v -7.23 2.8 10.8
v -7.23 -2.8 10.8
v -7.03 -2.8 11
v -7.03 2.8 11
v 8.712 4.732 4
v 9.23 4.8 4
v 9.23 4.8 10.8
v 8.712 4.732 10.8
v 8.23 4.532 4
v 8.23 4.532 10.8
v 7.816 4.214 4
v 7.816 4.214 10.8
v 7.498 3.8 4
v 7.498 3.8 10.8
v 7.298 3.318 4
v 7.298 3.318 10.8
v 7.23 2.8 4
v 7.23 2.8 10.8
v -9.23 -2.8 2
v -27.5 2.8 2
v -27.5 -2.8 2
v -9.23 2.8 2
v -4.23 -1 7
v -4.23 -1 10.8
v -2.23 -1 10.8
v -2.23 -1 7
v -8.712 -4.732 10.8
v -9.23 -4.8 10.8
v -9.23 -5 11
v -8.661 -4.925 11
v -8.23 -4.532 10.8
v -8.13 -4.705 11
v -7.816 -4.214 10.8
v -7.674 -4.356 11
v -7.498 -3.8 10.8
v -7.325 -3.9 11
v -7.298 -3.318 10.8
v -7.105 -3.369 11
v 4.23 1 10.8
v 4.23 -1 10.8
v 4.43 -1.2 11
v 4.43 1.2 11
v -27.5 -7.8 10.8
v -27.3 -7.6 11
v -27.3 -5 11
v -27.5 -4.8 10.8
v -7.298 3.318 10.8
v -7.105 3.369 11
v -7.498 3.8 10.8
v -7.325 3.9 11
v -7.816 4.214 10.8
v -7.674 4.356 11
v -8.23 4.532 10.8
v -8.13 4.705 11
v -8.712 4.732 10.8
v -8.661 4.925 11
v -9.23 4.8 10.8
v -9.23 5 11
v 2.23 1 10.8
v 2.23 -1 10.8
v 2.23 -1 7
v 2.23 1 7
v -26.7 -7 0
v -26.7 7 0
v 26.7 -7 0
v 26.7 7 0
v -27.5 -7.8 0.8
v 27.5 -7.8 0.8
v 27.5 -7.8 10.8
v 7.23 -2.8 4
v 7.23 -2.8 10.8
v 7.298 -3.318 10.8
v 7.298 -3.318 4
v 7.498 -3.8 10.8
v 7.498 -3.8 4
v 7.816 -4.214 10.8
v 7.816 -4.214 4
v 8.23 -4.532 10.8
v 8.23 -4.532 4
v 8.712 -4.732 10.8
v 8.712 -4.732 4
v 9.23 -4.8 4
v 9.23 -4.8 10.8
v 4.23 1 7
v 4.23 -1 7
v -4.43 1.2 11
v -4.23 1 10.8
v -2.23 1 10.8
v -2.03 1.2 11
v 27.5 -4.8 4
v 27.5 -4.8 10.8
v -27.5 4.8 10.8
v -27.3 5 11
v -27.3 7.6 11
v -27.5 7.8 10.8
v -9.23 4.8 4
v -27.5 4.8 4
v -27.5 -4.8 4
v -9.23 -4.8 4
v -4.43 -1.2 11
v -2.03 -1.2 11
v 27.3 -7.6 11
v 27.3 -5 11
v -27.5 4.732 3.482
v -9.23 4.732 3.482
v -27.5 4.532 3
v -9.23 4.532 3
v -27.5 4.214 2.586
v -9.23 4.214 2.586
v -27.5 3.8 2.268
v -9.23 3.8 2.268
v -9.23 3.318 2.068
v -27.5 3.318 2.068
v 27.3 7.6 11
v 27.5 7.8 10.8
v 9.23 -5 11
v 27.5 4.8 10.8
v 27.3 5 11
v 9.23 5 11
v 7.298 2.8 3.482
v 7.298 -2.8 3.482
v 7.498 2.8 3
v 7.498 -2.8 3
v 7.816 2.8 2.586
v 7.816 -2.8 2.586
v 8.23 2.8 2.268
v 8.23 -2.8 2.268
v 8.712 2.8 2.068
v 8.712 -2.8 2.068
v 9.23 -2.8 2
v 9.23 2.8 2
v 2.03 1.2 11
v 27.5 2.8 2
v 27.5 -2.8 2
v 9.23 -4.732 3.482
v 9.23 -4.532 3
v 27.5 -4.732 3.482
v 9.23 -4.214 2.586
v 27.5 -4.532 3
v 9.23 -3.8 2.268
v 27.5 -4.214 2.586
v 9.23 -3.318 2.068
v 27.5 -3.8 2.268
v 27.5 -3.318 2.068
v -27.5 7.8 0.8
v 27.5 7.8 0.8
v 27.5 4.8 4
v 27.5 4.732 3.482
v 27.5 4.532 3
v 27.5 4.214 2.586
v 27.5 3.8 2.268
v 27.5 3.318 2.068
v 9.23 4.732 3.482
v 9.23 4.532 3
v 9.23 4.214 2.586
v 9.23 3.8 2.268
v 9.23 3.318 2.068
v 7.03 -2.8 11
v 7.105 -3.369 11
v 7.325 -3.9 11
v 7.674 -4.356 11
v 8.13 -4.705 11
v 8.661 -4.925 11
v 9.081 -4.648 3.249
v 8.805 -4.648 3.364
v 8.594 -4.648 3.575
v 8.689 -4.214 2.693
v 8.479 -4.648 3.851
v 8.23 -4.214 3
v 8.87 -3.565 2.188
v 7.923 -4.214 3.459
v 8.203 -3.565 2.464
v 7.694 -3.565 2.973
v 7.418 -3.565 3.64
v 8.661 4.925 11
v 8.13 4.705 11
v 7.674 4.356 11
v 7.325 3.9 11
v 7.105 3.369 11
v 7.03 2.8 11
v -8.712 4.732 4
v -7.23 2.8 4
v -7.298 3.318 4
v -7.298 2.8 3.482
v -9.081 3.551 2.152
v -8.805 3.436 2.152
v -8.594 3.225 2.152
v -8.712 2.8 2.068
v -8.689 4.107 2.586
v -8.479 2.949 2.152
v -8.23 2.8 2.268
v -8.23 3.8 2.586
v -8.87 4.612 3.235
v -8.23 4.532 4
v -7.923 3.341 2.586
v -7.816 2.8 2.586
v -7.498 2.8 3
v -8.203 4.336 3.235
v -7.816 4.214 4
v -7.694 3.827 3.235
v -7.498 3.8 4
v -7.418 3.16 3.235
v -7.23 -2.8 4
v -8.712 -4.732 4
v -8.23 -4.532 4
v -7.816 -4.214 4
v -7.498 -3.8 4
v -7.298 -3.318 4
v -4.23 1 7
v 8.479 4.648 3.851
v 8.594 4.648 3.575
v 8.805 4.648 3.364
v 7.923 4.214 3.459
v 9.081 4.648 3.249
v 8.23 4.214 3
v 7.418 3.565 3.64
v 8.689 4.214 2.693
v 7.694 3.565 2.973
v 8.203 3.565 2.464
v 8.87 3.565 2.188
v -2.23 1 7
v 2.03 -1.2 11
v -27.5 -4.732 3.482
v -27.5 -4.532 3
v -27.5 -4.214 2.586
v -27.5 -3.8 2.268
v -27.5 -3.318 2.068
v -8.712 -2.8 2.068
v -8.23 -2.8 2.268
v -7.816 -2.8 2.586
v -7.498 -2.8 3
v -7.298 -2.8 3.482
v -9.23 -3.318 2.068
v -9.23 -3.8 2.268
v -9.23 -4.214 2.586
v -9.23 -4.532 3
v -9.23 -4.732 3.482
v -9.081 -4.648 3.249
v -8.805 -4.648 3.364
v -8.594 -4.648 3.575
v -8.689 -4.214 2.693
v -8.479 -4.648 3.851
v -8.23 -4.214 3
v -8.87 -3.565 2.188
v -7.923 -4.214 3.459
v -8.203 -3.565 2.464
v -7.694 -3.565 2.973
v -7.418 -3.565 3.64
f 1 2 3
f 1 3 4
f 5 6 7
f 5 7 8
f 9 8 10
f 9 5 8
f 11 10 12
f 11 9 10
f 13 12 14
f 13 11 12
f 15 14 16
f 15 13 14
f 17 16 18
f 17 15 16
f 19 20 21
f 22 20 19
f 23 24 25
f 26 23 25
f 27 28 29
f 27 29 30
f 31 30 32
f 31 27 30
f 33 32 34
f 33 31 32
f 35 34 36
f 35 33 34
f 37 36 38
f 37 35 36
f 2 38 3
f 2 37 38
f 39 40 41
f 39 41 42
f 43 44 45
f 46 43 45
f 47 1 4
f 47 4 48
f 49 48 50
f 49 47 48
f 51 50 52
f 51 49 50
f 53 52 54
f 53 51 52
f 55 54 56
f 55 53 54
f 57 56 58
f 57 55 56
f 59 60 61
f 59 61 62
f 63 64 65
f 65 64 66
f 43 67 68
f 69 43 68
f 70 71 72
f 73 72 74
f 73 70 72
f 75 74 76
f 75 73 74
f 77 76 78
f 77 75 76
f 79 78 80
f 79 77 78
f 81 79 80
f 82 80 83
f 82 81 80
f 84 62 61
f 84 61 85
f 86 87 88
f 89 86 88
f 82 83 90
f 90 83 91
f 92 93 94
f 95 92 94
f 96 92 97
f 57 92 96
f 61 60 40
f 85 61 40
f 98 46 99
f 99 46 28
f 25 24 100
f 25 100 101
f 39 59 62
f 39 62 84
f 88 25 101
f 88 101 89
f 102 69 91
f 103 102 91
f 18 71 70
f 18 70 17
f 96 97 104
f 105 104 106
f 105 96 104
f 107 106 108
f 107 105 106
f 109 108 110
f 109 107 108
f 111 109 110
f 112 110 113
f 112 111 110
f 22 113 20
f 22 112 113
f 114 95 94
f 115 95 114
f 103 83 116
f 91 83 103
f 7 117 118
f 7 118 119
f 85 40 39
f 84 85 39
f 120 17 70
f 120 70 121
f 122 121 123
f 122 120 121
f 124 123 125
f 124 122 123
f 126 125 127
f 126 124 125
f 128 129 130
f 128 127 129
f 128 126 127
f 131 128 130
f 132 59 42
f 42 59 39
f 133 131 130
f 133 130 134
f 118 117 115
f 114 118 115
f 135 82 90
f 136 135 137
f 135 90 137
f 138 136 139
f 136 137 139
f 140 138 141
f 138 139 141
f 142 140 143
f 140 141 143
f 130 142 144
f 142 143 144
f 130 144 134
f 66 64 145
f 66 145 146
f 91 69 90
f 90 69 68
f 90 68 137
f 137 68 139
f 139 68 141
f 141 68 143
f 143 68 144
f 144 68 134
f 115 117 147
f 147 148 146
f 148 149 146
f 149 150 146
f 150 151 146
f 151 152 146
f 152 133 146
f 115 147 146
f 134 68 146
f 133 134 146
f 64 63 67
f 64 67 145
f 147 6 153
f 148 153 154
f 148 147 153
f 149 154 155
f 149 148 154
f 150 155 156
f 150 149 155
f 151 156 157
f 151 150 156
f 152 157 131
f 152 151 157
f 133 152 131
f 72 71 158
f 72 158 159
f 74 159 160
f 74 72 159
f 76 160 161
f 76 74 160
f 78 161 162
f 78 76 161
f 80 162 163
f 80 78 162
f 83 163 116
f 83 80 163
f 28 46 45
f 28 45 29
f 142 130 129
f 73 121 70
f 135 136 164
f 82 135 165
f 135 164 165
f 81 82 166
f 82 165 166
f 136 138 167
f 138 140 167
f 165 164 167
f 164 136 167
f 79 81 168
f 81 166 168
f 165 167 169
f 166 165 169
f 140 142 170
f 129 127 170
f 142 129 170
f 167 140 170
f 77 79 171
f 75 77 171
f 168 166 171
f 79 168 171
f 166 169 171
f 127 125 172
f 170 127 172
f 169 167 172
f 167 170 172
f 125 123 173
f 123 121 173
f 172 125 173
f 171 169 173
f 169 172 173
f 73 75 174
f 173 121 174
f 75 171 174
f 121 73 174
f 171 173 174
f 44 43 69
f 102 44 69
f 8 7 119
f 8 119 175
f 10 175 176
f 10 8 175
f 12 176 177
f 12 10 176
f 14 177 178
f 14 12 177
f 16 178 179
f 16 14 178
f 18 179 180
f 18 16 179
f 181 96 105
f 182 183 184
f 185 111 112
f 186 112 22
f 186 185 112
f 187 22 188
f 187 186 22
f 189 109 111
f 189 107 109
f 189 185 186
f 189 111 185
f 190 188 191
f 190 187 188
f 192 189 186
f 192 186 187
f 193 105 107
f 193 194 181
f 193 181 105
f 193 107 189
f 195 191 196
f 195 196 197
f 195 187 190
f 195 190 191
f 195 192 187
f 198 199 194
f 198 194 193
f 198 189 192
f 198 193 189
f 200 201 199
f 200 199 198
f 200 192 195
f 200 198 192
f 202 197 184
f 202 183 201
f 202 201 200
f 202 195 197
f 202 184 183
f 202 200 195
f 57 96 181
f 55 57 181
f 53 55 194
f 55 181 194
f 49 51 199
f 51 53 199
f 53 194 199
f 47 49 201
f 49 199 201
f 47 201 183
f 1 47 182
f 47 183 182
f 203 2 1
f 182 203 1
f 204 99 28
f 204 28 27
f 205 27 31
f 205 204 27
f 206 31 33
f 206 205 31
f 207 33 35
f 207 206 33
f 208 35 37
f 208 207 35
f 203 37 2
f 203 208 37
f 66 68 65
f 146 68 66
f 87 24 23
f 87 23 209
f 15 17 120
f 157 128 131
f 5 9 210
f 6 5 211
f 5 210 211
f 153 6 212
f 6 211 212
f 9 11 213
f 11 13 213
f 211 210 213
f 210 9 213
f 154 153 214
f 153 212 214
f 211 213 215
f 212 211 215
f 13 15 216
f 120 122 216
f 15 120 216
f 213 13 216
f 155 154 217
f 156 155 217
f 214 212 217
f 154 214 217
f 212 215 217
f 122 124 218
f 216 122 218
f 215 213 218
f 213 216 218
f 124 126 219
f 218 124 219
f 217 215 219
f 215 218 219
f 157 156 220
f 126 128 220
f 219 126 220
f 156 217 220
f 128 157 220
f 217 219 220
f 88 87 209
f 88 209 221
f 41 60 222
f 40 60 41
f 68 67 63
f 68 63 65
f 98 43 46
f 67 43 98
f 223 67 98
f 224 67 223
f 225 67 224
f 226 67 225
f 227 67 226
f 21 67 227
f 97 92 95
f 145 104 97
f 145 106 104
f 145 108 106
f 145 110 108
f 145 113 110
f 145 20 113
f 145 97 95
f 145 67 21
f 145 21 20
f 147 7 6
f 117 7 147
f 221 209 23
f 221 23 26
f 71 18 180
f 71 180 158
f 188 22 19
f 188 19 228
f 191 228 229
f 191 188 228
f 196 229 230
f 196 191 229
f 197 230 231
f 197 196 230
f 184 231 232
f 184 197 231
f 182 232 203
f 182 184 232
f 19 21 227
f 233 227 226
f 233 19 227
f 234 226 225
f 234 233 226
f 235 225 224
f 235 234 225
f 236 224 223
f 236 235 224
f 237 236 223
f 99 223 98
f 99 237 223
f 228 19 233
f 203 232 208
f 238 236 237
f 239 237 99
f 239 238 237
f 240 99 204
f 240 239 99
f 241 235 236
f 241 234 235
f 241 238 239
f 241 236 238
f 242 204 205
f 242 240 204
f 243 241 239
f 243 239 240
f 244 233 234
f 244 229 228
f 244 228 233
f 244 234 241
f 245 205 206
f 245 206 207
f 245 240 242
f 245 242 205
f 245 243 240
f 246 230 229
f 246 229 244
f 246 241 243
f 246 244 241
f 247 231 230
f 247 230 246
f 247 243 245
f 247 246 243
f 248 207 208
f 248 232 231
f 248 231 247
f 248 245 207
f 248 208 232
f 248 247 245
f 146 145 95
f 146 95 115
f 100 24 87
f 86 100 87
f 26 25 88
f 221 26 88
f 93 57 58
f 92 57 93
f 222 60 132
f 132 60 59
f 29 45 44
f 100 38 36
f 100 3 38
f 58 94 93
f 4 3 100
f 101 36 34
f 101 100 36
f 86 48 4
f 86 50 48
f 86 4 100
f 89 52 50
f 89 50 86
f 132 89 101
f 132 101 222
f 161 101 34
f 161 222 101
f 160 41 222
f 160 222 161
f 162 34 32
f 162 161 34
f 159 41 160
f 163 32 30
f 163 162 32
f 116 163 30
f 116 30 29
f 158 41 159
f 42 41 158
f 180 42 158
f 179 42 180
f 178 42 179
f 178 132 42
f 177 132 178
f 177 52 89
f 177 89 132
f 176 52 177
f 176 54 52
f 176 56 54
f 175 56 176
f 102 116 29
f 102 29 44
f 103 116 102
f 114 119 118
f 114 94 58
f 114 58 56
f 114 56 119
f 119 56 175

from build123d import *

# Parameters (mm, degrees)
F0_W     = 55
F0_H     = 15.6
F1_DEPTH = 11
F2_W     = 2
F2_H     = 2
F3_DEPTH = 4
F4_W     = 20.27
F4_H     = 9.6
F5_DEPTH = 9
F6_R     = 2
F7_SIZE  = 0.2
F8_SIZE  = 0.8


with BuildPart() as f1:
    # F0 (on Top) → F1 (new body)
    with BuildSketch(Plane.XY):
        Rectangle(F0_W, F0_H)
    extrude(amount=F1_DEPTH)

    # F2 (on face) → F3 (cut)
    with BuildSketch(Plane.XY.offset(11)):
        with Locations((-3.23, 0)):
            Rectangle(F2_W, F2_H)
        with Locations((3.23, 0)):
            Rectangle(F2_W, F2_H)
    extrude(amount=-F3_DEPTH, mode=Mode.SUBTRACT)

    # F4 (on face) → F5 (cut)
    with BuildSketch(Plane.XY.offset(11)):
        with Locations((-17.365, 0)):
            Rectangle(F4_W, F4_H)
        with Locations((17.365, 0)):
            Rectangle(F4_W, F4_H)
    extrude(amount=-F5_DEPTH, mode=Mode.SUBTRACT)

    # F6
    f6_edges = [f1.edges().sort_by_distance(p)[0] for p in [
        (-7.23, 4.8, 6.5),
        (-17.365, 4.8, 2),
        (-7.23, 0, 2),
        (-17.365, -4.8, 2),
        (-7.23, -4.8, 6.5),
        (7.23, 0, 2),
        (7.23, 4.8, 6.5),
        (17.365, 4.8, 2),
        (17.365, -4.8, 2),
        (7.23, -4.8, 6.5),
    ]]
    fillet(f6_edges, radius=F6_R)

    # F7
    f7_edges = [f1.edges().sort_by_distance(p)[0] for p in [
        (-18.365, -4.8, 11),
        (-7.815786, -4.214214, 11),
        (-27.5, -6.3, 11),
        (-7.23, 0, 11),
        (0, -7.8, 11),
        (-7.815786, 4.214214, 11),
        (27.5, -6.3, 11),
        (-18.365, 4.8, 11),
        (18.365, -4.8, 11),
        (-27.5, 6.3, 11),
        (7.815786, -4.214214, 11),
        (0, 7.8, 11),
        (7.23, 0, 11),
        (27.5, 6.3, 11),
        (7.815786, 4.214214, 11),
        (18.365, 4.8, 11),
        (-2.23, 0, 11),
        (-3.23, -1, 11),
        (-3.23, 1, 11),
        (-4.23, 0, 11),
        (3.23, 1, 11),
        (4.23, 0, 11),
        (2.23, 0, 11),
        (3.23, -1, 11),
    ]]
    chamfer(f7_edges, length=F7_SIZE)

    # F8
    f8_edges = [f1.edges().sort_by_distance(p)[0] for p in [
        (27.5, 0, 0),
        (0, 7.8, 0),
        (-27.5, 0, 0),
        (0, -7.8, 0),
    ]]
    chamfer(f8_edges, length=F8_SIZE)


solid = f1.part
